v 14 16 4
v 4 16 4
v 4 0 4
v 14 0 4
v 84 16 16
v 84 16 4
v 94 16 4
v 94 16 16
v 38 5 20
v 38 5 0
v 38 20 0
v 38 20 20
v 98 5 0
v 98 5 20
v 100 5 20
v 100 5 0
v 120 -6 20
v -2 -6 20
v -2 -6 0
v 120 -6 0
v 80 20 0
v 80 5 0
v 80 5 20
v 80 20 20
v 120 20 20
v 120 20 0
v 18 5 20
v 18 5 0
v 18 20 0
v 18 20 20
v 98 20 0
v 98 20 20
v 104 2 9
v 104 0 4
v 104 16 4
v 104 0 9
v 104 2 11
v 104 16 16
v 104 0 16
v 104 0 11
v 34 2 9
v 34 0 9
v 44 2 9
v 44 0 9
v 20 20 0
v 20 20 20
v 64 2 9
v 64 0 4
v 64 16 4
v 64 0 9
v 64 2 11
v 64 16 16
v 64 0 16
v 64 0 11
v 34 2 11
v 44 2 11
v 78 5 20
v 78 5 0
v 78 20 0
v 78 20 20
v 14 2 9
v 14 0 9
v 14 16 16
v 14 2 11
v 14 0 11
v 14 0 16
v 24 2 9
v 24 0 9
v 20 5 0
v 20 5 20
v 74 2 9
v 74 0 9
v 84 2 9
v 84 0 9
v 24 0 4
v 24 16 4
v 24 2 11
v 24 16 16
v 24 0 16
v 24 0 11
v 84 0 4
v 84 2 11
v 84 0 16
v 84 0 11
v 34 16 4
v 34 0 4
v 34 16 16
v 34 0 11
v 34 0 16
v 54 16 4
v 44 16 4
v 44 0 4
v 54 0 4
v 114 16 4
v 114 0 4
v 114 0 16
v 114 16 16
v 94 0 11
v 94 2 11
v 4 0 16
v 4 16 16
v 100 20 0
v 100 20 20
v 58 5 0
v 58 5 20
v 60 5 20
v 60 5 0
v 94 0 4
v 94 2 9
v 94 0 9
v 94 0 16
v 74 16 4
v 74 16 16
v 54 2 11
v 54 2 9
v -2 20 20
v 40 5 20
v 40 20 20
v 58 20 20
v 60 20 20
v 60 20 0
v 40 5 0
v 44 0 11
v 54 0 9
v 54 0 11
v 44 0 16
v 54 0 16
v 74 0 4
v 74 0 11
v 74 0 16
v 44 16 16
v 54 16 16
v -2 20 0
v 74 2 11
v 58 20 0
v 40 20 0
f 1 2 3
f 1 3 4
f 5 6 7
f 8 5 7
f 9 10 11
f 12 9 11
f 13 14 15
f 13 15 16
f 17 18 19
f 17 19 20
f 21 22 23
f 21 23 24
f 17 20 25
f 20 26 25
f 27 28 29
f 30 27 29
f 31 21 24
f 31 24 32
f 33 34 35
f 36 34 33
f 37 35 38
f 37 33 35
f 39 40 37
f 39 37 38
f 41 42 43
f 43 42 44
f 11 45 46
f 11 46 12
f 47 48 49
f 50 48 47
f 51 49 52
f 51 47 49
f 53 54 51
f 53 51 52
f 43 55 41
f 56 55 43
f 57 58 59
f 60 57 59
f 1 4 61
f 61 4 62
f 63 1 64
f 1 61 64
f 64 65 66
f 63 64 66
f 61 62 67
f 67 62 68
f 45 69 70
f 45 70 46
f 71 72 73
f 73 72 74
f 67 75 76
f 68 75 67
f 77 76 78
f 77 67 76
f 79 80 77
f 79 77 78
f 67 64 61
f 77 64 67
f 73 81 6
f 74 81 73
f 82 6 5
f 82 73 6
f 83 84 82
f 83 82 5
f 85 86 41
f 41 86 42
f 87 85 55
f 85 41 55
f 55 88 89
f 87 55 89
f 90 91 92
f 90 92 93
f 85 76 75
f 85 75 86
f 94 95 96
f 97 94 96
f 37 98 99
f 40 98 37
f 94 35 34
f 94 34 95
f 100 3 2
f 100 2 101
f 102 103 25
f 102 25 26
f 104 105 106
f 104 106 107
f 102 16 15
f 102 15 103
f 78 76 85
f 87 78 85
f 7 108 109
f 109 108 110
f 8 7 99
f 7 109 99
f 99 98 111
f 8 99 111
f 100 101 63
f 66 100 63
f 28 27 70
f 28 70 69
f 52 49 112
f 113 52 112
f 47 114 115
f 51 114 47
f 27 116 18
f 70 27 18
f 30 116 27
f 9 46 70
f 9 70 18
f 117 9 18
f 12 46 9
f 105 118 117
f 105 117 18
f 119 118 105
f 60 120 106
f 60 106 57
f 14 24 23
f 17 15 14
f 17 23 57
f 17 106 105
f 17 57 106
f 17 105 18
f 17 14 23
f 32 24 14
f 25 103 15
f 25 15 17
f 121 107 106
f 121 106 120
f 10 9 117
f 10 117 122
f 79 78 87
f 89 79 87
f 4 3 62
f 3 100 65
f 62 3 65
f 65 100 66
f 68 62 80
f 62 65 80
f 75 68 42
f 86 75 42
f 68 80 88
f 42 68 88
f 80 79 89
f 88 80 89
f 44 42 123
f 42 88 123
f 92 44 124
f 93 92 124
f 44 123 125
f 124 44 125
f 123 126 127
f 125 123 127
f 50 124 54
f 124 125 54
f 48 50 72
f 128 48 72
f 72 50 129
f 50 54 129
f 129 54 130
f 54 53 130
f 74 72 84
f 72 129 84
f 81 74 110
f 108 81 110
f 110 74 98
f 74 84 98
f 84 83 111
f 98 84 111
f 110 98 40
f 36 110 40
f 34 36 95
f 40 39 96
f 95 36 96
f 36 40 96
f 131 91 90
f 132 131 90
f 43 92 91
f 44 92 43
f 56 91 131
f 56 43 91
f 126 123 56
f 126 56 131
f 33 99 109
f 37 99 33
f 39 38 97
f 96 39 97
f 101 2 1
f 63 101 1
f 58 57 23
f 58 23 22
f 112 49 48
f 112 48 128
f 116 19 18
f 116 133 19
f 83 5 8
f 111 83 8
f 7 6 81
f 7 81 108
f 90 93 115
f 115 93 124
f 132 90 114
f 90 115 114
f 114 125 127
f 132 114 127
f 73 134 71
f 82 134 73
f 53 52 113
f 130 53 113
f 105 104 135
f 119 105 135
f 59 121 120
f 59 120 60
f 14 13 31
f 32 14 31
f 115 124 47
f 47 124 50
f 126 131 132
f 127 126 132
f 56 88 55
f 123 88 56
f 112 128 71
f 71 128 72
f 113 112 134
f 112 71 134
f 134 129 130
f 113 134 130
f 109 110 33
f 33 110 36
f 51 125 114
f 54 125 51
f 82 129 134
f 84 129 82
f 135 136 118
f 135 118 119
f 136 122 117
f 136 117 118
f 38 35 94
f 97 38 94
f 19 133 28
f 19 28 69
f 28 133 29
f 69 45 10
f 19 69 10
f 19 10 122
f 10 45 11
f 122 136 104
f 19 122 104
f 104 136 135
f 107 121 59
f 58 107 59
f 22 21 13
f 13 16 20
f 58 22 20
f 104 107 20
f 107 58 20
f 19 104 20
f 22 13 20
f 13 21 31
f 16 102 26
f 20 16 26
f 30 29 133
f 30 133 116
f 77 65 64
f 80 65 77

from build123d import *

# Parameters (mm, degrees)
SKETCH1_W           = 18
SKETCH1_H           = 20
BOSS_EXTRUDE1_DEPTH = 20
SKETCH2_W           = 10
SKETCH2_H           = 12
CUT_EXTRUDE1_DEPTH  = 16
SKETCH3_W           = 20
SKETCH3_H           = 5
BOSS_EXTRUDE2_DEPTH = 2
LPATTERN1_COUNT     = 6
LPATTERN1_PITCH     = 20
SKETCH4_W           = 20
SKETCH4_H           = 15
BOSS_EXTRUDE3_DEPTH = 2
SKETCH5_W           = 20
SKETCH5_H           = 20
BOSS_EXTRUDE4_DEPTH = 2
SKETCH6_W           = 110
SKETCH6_H           = 2
CUT_EXTRUDE2_DEPTH  = 2
SKETCH7_W           = 122
SKETCH7_H           = 20
BOSS_EXTRUDE5_DEPTH = 6


with BuildPart() as part:
    # Sketch1 → Boss-Extrude1 (new body)
    with BuildSketch(Plane.XY):
        with Locations((9, 10)):
            Rectangle(SKETCH1_W, SKETCH1_H)
    extrude(amount=BOSS_EXTRUDE1_DEPTH)

    # Sketch2 → Cut-Extrude1 (cut)
    with BuildSketch(Plane.XZ):
        with Locations((9, 10)):
            Rectangle(SKETCH2_W, SKETCH2_H)
    extrude(amount=-CUT_EXTRUDE1_DEPTH, mode=Mode.SUBTRACT)

    # Sketch3 → Boss-Extrude2 (add)
    with BuildSketch(Plane(origin=(18, 0, 0), x_dir=(0, 0, -1), z_dir=(1, 0, 0))):
        with Locations((-10, 2.5)):
            Rectangle(SKETCH3_W, SKETCH3_H)
    extrude(amount=BOSS_EXTRUDE2_DEPTH)


with BuildPart() as lpattern1_1:
    # LPattern1: pattern copy
    add(part.part.moved(Location(Vector(1, 0, 0) * (1 * LPATTERN1_PITCH))))


with BuildPart() as lpattern1_2:
    # LPattern1: pattern copy
    add(part.part.moved(Location(Vector(1, 0, 0) * (2 * LPATTERN1_PITCH))))


with BuildPart() as lpattern1_3:
    # LPattern1: pattern copy
    add(part.part.moved(Location(Vector(1, 0, 0) * (3 * LPATTERN1_PITCH))))


with BuildPart() as lpattern1_4:
    # LPattern1: pattern copy
    add(part.part.moved(Location(Vector(1, 0, 0) * (4 * LPATTERN1_PITCH))))


with BuildPart() as lpattern1_5:
    # LPattern1: pattern copy
    add(part.part.moved(Location(Vector(1, 0, 0) * (5 * LPATTERN1_PITCH))))

    # Sketch4 → Boss-Extrude3 (add)
    with BuildSketch(Plane(origin=(118, 0, 0), x_dir=(0, 0, -1), z_dir=(1, 0, 0))):
        with Locations((-10, 12.5)):
            Rectangle(SKETCH4_W, SKETCH4_H)
    extrude(amount=BOSS_EXTRUDE3_DEPTH)


with BuildPart() as part_1:
    add(part.part)

    # Sketch5 → Boss-Extrude4 (add)
    with BuildSketch(Plane.ZY):
        with Locations((10, 10)):
            Rectangle(SKETCH5_W, SKETCH5_H)
    extrude(amount=BOSS_EXTRUDE4_DEPTH)


with BuildPart() as lpattern1_1_1:
    add(lpattern1_1.part)

    # Combine1: union LPattern1_2, LPattern1_3, LPattern1_4, part, LPattern1_5
    add(lpattern1_2.part)
    add(lpattern1_3.part)
    add(lpattern1_4.part)
    add(part_1.part)
    add(lpattern1_5.part)

    # Sketch6 → Cut-Extrude2 (cut)
    with BuildSketch(Plane.XZ):
        with Locations((59, 10)):
            Rectangle(SKETCH6_W, SKETCH6_H)
    extrude(amount=-CUT_EXTRUDE2_DEPTH, mode=Mode.SUBTRACT)

    # Sketch7 → Boss-Extrude5 (add)
    with BuildSketch(Plane.XZ):
        with Locations((59, 10)):
            Rectangle(SKETCH7_W, SKETCH7_H)
    extrude(amount=BOSS_EXTRUDE5_DEPTH)


solid = lpattern1_1_1.part
